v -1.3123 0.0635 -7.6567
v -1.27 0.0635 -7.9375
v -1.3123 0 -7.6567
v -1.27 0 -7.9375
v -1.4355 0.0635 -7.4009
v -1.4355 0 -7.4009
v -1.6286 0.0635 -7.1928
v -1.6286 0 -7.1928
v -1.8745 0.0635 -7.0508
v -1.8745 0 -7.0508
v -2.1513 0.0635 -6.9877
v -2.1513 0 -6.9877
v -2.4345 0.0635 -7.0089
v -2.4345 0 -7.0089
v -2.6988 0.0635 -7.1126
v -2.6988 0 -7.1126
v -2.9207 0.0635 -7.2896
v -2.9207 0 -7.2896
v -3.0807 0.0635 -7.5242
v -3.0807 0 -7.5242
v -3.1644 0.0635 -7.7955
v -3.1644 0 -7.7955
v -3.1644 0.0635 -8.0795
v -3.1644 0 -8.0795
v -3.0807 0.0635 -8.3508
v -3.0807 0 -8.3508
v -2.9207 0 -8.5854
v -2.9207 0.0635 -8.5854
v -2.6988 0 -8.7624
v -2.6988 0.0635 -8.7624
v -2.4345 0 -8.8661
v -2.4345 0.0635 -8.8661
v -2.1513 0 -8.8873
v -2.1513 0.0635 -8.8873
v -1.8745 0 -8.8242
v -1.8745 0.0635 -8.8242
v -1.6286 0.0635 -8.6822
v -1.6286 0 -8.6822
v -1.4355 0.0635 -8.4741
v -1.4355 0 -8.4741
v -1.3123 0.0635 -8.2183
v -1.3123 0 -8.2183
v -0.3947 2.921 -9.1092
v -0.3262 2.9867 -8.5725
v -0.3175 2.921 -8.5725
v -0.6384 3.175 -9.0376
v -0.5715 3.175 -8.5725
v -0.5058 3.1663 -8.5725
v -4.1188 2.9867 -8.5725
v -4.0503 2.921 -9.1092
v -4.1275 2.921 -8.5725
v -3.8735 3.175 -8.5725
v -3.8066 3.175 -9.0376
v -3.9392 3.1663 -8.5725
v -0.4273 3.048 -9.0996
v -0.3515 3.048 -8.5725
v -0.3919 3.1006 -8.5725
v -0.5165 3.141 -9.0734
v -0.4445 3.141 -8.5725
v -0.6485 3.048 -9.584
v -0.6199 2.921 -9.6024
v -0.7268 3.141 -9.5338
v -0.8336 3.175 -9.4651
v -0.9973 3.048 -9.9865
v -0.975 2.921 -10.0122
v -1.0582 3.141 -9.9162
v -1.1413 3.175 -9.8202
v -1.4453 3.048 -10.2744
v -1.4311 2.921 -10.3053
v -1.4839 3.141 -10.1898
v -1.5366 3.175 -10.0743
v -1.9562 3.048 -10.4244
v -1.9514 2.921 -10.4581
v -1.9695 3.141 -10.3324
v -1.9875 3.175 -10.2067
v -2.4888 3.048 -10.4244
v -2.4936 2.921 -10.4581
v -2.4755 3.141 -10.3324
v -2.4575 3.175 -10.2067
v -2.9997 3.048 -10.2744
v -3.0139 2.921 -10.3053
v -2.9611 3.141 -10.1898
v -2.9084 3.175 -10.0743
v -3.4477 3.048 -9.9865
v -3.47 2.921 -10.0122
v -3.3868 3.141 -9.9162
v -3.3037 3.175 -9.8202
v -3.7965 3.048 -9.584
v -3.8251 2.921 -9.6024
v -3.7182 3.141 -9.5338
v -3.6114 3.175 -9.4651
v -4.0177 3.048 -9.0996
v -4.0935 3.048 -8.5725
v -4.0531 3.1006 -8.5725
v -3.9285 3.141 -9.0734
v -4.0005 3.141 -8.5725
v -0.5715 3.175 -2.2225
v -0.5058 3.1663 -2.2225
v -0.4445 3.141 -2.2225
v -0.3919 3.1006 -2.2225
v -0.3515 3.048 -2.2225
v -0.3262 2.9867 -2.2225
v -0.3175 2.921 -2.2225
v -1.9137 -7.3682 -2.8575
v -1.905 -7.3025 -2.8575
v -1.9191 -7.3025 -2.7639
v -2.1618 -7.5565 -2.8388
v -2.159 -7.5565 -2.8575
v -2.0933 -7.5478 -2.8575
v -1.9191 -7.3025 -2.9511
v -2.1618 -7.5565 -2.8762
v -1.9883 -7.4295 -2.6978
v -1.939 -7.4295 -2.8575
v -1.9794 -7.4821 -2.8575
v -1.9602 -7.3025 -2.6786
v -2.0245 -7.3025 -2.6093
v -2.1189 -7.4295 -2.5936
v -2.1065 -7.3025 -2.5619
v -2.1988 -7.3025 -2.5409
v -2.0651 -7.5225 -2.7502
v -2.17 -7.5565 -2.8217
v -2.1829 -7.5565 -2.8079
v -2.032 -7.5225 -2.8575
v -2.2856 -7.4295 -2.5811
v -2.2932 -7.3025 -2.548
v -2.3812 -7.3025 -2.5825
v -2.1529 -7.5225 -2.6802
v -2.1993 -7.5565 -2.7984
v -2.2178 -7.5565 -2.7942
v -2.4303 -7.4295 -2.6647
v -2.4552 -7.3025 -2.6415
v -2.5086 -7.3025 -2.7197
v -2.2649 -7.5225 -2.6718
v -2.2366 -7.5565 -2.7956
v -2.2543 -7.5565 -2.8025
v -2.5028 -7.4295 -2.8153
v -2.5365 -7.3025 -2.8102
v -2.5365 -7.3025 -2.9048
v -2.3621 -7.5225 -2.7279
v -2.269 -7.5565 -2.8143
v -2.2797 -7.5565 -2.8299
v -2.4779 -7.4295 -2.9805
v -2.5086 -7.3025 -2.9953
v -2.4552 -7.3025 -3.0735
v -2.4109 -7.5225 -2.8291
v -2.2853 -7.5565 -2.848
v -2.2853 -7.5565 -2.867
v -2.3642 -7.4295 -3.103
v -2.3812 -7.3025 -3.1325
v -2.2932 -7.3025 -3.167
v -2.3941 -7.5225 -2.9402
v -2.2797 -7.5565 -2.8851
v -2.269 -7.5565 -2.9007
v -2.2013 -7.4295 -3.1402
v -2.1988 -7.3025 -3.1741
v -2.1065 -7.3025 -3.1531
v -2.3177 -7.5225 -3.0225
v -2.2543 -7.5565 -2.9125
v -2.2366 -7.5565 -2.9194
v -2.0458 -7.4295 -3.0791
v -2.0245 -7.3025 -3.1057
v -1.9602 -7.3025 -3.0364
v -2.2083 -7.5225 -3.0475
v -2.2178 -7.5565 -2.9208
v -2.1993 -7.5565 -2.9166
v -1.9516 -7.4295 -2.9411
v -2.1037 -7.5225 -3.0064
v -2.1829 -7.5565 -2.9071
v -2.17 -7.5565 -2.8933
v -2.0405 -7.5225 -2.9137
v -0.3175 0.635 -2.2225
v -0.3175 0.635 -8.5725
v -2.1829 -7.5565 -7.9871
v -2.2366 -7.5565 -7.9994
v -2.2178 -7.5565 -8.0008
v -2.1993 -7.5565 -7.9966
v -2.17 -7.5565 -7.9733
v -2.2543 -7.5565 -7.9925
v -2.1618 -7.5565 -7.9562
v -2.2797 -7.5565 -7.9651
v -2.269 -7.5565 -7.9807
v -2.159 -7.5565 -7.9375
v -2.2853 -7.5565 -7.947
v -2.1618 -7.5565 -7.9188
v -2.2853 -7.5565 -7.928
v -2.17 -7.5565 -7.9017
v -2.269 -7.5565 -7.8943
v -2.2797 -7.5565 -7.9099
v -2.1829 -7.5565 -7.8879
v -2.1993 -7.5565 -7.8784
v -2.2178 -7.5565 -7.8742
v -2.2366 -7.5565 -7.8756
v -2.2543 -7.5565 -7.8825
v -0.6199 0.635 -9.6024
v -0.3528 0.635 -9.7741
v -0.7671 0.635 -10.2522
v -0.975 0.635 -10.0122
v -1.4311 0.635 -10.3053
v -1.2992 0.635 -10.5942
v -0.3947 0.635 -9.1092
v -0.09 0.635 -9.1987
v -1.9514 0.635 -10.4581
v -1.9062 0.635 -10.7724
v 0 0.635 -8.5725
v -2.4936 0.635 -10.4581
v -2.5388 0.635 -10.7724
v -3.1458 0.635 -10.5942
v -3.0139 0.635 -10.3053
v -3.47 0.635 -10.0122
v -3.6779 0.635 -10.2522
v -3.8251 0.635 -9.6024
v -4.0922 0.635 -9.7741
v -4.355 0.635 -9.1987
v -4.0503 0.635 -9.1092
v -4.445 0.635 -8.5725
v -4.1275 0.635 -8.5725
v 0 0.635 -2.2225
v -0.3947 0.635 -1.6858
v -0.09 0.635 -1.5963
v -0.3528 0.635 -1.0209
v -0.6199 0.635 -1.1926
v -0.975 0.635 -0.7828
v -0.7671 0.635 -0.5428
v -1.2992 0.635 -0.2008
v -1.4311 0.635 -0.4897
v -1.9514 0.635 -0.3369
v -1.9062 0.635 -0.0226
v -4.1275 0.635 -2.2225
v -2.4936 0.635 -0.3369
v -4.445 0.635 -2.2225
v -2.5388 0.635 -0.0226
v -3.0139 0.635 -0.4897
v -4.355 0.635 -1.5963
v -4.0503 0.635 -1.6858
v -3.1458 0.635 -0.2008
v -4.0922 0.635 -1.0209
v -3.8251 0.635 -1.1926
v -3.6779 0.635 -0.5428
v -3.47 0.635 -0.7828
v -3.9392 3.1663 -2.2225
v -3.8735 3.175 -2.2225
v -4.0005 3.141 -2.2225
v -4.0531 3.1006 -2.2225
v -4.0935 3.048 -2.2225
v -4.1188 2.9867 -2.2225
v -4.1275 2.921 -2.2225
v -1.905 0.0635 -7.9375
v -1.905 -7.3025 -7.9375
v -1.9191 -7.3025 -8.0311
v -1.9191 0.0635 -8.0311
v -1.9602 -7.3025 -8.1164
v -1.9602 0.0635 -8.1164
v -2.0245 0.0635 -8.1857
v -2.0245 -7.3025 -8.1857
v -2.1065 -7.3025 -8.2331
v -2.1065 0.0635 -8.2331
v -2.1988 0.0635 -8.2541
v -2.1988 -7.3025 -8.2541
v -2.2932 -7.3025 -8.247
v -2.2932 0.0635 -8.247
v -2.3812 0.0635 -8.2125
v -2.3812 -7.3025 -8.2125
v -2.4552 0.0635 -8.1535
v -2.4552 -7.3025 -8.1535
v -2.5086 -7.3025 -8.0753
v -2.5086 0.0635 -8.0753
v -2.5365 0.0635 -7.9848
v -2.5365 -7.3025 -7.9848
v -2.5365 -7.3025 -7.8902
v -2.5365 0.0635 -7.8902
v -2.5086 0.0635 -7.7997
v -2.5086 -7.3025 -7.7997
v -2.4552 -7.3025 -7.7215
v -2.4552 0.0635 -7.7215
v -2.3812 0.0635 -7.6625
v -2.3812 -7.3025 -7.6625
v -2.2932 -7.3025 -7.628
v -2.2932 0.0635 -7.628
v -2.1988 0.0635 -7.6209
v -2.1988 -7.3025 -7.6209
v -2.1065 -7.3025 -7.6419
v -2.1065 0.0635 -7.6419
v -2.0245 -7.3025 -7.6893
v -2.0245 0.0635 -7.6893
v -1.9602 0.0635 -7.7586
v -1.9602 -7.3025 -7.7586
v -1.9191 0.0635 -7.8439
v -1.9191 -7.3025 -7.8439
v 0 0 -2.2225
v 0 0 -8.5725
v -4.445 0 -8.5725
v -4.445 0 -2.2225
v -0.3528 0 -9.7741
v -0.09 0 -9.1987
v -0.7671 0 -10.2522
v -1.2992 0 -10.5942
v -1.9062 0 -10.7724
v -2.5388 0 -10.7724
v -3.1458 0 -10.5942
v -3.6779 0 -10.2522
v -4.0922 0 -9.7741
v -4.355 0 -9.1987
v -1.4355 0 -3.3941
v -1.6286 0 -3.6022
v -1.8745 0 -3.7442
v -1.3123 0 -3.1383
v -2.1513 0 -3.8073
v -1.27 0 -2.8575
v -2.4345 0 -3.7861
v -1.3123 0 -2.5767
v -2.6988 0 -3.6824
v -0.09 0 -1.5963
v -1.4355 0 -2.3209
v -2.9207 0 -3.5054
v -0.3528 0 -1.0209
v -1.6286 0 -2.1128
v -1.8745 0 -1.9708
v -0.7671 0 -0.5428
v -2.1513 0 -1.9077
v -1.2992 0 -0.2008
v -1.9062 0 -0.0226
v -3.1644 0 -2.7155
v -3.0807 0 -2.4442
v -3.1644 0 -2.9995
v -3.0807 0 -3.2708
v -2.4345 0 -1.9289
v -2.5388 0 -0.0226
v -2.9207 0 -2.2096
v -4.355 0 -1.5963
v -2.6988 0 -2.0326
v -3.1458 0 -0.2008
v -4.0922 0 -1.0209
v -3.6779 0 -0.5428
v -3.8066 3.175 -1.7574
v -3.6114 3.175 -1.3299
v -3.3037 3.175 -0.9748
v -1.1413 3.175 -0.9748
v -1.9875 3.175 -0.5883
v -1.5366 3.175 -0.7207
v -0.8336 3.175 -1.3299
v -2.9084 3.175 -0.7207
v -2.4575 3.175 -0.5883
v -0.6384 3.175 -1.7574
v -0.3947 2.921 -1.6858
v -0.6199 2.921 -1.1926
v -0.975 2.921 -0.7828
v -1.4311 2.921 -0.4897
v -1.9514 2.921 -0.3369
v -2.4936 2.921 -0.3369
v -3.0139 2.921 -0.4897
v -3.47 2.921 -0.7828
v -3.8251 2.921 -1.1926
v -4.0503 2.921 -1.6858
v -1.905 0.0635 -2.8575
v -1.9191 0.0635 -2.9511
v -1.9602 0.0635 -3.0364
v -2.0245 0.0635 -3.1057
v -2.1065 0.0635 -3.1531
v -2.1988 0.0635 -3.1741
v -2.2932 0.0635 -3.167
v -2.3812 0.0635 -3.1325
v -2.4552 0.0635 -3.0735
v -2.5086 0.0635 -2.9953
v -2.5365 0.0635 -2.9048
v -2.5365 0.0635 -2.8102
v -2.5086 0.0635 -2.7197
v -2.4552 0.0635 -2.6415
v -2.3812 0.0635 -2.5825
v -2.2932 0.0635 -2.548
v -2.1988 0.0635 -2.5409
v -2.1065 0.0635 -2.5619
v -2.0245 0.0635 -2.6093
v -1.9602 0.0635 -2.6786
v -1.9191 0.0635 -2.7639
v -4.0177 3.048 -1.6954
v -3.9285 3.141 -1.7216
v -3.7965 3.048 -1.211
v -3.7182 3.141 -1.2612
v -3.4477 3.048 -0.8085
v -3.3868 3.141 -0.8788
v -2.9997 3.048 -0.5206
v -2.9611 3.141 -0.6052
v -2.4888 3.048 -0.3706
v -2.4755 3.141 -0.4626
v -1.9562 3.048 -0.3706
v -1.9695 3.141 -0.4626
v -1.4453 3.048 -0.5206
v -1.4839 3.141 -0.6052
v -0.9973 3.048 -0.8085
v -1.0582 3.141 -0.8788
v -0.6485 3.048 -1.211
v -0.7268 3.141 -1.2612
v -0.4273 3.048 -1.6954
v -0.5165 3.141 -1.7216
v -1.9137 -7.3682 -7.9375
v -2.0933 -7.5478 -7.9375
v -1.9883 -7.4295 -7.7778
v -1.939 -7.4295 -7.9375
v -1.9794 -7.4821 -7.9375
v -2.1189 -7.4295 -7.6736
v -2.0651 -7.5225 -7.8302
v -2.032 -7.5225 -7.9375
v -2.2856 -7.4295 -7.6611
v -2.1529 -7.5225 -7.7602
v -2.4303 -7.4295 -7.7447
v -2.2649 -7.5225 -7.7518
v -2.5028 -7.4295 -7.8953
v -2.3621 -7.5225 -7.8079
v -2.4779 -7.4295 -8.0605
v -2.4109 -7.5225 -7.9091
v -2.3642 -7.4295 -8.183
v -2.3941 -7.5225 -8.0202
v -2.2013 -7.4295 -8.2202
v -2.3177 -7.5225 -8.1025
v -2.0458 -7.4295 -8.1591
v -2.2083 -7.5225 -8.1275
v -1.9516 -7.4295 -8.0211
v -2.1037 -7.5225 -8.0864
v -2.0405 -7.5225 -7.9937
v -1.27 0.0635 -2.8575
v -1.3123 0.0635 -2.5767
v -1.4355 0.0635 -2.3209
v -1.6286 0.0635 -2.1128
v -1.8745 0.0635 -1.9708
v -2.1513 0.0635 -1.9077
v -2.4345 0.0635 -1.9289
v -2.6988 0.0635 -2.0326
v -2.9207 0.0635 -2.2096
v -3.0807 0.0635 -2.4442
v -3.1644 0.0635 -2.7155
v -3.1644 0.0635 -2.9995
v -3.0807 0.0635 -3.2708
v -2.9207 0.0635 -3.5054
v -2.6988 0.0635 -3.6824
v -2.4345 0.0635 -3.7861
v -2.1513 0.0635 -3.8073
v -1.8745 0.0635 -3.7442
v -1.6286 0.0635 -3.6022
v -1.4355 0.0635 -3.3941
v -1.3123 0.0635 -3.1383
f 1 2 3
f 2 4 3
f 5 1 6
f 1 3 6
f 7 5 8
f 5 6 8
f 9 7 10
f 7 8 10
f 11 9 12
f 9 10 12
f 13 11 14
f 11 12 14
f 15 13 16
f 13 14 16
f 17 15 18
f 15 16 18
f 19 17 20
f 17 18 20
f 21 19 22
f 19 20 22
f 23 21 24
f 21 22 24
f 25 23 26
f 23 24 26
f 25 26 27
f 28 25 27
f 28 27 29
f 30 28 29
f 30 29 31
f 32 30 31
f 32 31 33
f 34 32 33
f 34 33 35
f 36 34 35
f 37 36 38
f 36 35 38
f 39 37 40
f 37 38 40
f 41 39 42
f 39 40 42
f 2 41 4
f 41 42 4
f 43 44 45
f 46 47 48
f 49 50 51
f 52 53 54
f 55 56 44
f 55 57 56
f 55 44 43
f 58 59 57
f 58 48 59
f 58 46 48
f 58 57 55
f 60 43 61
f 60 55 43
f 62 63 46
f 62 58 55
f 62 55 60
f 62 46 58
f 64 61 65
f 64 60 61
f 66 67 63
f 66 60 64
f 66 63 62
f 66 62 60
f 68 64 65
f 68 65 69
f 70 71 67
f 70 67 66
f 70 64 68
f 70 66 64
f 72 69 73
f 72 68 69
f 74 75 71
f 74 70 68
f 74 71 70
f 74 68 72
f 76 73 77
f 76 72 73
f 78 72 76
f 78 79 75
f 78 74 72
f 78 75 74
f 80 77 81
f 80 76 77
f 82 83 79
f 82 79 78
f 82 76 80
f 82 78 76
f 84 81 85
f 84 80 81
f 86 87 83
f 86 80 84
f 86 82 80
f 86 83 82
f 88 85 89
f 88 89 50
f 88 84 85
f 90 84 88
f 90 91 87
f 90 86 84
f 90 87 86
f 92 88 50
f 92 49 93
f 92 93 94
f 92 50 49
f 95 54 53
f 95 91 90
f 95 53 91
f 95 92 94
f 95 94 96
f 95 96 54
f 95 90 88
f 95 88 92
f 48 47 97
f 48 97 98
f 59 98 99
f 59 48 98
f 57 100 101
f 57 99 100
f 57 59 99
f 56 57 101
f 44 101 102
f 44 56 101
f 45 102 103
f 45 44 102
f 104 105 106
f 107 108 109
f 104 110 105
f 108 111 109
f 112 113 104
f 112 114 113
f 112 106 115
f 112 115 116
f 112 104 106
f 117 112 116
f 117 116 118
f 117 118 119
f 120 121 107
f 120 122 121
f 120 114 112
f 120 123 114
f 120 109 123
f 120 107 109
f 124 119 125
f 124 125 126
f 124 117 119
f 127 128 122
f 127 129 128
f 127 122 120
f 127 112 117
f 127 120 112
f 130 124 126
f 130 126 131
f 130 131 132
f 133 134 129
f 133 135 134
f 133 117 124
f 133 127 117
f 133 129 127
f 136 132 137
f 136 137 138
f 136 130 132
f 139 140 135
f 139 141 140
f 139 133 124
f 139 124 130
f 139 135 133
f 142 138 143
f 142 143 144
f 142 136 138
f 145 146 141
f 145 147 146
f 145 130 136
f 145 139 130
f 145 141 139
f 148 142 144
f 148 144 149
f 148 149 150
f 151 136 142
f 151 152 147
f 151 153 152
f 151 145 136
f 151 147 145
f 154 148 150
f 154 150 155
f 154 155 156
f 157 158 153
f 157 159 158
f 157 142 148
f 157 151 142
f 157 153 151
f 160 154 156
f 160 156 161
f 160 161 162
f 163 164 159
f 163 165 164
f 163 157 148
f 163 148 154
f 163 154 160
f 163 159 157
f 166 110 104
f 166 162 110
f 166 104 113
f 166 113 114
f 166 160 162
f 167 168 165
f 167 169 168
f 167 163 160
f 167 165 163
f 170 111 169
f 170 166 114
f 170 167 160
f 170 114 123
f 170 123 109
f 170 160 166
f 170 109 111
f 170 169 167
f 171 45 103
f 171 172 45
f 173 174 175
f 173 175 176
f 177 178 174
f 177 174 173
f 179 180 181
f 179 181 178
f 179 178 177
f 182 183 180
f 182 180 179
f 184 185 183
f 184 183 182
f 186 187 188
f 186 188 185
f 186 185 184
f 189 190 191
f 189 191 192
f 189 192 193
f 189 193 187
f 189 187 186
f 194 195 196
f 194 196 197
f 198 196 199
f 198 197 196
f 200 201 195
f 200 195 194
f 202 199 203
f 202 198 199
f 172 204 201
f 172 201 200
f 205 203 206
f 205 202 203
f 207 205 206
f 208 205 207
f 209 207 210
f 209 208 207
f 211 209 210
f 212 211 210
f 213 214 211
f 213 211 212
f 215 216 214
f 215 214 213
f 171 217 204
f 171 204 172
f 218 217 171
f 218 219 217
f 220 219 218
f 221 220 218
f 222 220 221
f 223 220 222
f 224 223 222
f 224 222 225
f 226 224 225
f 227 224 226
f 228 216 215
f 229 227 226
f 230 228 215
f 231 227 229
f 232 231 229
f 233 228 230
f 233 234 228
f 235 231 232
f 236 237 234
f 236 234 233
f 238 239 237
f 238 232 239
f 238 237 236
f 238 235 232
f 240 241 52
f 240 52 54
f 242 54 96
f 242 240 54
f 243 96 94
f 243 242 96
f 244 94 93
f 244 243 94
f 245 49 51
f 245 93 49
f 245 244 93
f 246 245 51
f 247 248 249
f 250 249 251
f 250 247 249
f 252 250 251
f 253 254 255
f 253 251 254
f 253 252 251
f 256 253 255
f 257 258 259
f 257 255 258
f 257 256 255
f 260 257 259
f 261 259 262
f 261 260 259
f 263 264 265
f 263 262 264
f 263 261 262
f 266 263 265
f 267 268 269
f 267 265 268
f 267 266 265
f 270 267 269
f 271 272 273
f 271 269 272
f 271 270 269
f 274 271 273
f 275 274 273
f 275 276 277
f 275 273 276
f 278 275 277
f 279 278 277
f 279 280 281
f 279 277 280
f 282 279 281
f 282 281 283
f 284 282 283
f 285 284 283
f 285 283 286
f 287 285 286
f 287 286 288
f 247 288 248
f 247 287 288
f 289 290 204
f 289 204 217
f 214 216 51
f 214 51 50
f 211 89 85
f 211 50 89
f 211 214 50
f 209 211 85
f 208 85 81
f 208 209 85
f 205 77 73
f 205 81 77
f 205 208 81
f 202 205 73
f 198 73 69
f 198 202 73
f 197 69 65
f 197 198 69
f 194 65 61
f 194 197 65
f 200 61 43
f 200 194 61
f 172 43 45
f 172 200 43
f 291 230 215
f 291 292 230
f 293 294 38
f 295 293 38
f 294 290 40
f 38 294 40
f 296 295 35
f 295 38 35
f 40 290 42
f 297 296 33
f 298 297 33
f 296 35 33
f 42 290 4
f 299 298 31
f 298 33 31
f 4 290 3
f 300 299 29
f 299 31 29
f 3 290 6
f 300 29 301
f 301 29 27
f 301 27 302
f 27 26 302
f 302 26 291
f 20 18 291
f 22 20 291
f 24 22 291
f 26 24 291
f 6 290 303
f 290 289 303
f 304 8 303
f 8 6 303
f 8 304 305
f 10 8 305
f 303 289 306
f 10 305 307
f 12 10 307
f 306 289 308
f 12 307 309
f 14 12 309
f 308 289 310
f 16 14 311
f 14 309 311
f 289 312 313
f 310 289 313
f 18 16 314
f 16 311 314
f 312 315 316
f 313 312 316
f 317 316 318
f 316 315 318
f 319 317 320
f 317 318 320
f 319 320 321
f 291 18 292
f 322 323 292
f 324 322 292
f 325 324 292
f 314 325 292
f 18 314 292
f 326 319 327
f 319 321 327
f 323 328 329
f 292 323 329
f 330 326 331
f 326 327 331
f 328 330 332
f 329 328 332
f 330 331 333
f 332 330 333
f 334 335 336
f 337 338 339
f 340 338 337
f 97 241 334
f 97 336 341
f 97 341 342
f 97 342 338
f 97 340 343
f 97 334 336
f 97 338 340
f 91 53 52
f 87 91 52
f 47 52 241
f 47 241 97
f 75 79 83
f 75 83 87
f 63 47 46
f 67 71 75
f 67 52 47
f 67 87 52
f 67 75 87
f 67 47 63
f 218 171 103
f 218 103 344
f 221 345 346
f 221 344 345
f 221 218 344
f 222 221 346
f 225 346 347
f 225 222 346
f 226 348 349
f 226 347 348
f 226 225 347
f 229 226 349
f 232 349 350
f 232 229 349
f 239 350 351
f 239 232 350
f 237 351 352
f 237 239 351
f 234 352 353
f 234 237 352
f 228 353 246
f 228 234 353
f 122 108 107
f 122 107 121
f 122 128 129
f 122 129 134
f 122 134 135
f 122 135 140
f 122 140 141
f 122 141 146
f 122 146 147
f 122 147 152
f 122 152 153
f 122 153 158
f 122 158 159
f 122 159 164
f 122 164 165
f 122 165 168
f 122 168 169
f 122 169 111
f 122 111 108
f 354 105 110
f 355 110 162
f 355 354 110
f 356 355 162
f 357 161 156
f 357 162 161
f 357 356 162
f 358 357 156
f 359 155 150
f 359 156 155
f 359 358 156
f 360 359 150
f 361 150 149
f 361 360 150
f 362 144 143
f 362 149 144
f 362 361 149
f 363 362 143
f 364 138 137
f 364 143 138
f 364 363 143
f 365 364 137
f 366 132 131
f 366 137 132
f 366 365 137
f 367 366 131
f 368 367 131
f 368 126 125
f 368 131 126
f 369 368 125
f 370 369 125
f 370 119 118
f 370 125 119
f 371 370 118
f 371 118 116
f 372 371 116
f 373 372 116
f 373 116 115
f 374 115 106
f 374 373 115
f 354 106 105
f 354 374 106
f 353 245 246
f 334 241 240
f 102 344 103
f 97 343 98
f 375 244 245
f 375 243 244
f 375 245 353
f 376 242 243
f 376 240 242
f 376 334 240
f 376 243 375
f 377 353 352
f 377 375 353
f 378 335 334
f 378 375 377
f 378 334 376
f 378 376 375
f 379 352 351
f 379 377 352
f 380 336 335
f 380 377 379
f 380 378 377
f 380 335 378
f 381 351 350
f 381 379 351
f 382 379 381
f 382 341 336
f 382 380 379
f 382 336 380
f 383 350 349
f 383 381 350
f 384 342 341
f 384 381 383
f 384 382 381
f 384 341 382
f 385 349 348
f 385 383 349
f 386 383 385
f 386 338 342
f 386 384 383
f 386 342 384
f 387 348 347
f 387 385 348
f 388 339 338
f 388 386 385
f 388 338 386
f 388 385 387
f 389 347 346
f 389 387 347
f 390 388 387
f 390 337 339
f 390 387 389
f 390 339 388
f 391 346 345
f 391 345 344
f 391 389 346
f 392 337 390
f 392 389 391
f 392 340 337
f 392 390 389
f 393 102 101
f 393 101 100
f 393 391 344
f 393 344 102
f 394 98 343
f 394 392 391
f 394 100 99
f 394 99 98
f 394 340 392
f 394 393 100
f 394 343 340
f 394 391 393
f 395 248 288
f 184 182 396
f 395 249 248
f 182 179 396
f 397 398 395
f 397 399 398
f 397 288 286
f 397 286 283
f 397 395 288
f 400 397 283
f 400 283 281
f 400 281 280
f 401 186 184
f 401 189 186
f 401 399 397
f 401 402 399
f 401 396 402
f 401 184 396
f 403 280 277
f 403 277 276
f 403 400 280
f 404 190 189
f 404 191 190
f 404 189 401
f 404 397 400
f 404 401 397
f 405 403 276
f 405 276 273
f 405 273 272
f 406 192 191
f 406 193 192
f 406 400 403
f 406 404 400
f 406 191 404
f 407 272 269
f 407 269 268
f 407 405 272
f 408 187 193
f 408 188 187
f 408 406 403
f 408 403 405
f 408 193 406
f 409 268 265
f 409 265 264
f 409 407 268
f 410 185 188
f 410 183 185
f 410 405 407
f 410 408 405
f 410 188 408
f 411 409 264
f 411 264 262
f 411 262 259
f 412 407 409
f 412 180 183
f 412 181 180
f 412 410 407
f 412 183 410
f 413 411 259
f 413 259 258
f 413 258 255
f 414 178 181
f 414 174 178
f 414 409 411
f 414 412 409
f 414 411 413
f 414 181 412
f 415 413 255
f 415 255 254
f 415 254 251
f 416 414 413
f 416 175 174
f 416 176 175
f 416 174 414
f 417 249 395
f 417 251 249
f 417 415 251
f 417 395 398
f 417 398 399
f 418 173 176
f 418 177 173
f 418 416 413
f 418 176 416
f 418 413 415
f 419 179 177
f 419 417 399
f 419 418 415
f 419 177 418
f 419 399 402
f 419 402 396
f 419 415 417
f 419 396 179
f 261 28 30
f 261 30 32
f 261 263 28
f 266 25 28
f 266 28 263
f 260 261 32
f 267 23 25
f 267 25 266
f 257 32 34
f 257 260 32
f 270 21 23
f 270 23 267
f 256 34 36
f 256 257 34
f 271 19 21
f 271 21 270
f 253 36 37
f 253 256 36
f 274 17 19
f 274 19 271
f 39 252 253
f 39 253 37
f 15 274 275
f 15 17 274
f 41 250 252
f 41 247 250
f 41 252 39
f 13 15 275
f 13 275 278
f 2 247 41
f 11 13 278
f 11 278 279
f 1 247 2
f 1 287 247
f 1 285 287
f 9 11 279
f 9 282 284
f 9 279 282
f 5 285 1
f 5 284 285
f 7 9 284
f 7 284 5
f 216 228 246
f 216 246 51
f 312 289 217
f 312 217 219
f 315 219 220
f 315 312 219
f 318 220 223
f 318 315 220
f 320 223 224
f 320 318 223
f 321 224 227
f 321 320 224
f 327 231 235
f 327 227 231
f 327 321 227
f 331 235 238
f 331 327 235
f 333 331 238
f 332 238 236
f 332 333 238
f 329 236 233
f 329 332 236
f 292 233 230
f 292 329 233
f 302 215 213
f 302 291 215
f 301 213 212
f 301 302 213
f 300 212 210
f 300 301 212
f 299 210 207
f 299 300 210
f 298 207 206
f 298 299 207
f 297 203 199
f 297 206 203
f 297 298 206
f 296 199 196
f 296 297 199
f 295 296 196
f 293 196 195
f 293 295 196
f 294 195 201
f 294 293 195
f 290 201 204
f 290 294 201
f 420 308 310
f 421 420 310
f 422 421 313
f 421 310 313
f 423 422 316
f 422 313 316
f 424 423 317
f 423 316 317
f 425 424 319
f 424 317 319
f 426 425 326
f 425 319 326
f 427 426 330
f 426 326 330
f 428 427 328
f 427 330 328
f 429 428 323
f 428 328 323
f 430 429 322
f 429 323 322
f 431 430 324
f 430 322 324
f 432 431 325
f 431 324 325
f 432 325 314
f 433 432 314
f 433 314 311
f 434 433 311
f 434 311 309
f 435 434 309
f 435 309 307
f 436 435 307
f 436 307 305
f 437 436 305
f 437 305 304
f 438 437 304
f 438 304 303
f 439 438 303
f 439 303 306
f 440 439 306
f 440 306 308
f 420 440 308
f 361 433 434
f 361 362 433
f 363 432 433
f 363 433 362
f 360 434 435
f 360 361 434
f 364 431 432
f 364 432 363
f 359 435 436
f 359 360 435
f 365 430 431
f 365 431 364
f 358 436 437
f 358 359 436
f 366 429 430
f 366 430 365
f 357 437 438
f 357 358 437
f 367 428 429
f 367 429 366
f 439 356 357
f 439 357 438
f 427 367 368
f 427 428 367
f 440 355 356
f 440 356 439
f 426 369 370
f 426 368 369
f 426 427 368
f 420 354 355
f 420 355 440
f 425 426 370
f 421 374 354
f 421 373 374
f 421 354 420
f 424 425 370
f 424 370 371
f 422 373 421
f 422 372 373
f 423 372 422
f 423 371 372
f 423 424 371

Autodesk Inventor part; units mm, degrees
ref_plane "YZ Plane" through (0, 0, 0) normal (1, 0, 0) x (0, 1, 0)
ref_plane "XZ Plane" through (0, 0, 0) normal (0, 1, 0) x (-1, 0, 0)
ref_plane "XY Plane" through (0, 0, 0) normal (0, 0, 1) x (1, 0, 0)
sketch "Náčrt1" plane through (0, 0, 0) normal (0, 1, 0) x (-1, 0, 0)
  line L0 (4.445, -2.2225) -> (4.445, -8.5725)
  line L1 (0, -8.5725) -> (0, -2.2225)
  arc A0 (0, -8.5725) -> (4.445, -8.5725) centre (2.2225, -8.5725) ccw
  arc A1 (4.445, -2.2225) -> (0, -2.2225) centre (2.2225, -2.2225) ccw
  point P0 (0, 0)
  dimension "d2" = 4.445
  dimension "d3" = 4.445
extrude "Vysunutí1" add sketch "Náčrt1" along normal blind 0.635
sketch "Náčrt2" plane through (0, 0.635, 0) normal (0, 1, 0) x (1, 0, 0)
  arc A0 (0, 8.5725) -> (-4.445, 8.5725) centre (-2.2225, 8.5725) ccw projected
  arc A1 (-4.445, 2.2225) -> (0, 2.2225) centre (-2.2225, 2.2225) ccw projected
  arc A2 (-4.1275, 2.2225) -> (-0.3175, 2.2225) centre (-2.2225, 2.2225) ccw
  arc A3 (-0.3175, 8.5725) -> (-4.1275, 8.5725) centre (-2.2225, 8.5725) ccw
  line L0 (-4.1275, 2.2225) -> (-4.1275, 8.5725)
  line L1 (-0.3175, 8.5725) -> (-0.3175, 2.2225)
  point P0 (0, 0)
  point P1 (-2.2225, 5.3975)
extrude "Vysunutí2" add sketch "Náčrt2" along normal blind 2.54
fillet "Zaoblení1" radius 0.254 4 edges at (-2.2225, 3.175, -10.4775) (-4.1275, 3.175, -5.3975) (-2.2225, 3.175, -0.3175) (-0.3175, 3.175, -5.3975)
sketch "Náčrt3" plane through (0, 0, 0) normal (0, -1, 0) x (1, 0, 0)
  circle A0 centre (-2.2225, -2.8575) radius 0.9525
  circle A1 centre (-2.2225, -7.9375) radius 0.9525
  point P0 (0, 0)
  dimension "d12" = 1.905
  dimension "d13" = 1.905
extrude "Vysunutí3" cut sketch "Náčrt3" against normal blind 0.0635
sketch "Náčrt4" plane through (-2.2225, 0.0635, -2.8575) normal (0, -1, 0) x (1, 0, 0)
  circle A0 centre (0, 0) radius 0.9525 projected
  circle A1 centre (0, 0) radius 0.3175
  circle A2 centre (0, -5.08) radius 0.9525 projected
  circle A3 centre (0, -5.08) radius 0.3175
  point P0 (2.2225, 2.8575)
  dimension "d16" = 0.635
extrude "Vysunutí4" add sketch "Náčrt4" along normal blind 7.62 contours A1 | A3
fillet "Zaoblení2" radius 0.254 2 edges at (-2.54, -7.5565, -2.8575) (-2.54, -7.5565, -7.9375)
properties part number "Crystal"
